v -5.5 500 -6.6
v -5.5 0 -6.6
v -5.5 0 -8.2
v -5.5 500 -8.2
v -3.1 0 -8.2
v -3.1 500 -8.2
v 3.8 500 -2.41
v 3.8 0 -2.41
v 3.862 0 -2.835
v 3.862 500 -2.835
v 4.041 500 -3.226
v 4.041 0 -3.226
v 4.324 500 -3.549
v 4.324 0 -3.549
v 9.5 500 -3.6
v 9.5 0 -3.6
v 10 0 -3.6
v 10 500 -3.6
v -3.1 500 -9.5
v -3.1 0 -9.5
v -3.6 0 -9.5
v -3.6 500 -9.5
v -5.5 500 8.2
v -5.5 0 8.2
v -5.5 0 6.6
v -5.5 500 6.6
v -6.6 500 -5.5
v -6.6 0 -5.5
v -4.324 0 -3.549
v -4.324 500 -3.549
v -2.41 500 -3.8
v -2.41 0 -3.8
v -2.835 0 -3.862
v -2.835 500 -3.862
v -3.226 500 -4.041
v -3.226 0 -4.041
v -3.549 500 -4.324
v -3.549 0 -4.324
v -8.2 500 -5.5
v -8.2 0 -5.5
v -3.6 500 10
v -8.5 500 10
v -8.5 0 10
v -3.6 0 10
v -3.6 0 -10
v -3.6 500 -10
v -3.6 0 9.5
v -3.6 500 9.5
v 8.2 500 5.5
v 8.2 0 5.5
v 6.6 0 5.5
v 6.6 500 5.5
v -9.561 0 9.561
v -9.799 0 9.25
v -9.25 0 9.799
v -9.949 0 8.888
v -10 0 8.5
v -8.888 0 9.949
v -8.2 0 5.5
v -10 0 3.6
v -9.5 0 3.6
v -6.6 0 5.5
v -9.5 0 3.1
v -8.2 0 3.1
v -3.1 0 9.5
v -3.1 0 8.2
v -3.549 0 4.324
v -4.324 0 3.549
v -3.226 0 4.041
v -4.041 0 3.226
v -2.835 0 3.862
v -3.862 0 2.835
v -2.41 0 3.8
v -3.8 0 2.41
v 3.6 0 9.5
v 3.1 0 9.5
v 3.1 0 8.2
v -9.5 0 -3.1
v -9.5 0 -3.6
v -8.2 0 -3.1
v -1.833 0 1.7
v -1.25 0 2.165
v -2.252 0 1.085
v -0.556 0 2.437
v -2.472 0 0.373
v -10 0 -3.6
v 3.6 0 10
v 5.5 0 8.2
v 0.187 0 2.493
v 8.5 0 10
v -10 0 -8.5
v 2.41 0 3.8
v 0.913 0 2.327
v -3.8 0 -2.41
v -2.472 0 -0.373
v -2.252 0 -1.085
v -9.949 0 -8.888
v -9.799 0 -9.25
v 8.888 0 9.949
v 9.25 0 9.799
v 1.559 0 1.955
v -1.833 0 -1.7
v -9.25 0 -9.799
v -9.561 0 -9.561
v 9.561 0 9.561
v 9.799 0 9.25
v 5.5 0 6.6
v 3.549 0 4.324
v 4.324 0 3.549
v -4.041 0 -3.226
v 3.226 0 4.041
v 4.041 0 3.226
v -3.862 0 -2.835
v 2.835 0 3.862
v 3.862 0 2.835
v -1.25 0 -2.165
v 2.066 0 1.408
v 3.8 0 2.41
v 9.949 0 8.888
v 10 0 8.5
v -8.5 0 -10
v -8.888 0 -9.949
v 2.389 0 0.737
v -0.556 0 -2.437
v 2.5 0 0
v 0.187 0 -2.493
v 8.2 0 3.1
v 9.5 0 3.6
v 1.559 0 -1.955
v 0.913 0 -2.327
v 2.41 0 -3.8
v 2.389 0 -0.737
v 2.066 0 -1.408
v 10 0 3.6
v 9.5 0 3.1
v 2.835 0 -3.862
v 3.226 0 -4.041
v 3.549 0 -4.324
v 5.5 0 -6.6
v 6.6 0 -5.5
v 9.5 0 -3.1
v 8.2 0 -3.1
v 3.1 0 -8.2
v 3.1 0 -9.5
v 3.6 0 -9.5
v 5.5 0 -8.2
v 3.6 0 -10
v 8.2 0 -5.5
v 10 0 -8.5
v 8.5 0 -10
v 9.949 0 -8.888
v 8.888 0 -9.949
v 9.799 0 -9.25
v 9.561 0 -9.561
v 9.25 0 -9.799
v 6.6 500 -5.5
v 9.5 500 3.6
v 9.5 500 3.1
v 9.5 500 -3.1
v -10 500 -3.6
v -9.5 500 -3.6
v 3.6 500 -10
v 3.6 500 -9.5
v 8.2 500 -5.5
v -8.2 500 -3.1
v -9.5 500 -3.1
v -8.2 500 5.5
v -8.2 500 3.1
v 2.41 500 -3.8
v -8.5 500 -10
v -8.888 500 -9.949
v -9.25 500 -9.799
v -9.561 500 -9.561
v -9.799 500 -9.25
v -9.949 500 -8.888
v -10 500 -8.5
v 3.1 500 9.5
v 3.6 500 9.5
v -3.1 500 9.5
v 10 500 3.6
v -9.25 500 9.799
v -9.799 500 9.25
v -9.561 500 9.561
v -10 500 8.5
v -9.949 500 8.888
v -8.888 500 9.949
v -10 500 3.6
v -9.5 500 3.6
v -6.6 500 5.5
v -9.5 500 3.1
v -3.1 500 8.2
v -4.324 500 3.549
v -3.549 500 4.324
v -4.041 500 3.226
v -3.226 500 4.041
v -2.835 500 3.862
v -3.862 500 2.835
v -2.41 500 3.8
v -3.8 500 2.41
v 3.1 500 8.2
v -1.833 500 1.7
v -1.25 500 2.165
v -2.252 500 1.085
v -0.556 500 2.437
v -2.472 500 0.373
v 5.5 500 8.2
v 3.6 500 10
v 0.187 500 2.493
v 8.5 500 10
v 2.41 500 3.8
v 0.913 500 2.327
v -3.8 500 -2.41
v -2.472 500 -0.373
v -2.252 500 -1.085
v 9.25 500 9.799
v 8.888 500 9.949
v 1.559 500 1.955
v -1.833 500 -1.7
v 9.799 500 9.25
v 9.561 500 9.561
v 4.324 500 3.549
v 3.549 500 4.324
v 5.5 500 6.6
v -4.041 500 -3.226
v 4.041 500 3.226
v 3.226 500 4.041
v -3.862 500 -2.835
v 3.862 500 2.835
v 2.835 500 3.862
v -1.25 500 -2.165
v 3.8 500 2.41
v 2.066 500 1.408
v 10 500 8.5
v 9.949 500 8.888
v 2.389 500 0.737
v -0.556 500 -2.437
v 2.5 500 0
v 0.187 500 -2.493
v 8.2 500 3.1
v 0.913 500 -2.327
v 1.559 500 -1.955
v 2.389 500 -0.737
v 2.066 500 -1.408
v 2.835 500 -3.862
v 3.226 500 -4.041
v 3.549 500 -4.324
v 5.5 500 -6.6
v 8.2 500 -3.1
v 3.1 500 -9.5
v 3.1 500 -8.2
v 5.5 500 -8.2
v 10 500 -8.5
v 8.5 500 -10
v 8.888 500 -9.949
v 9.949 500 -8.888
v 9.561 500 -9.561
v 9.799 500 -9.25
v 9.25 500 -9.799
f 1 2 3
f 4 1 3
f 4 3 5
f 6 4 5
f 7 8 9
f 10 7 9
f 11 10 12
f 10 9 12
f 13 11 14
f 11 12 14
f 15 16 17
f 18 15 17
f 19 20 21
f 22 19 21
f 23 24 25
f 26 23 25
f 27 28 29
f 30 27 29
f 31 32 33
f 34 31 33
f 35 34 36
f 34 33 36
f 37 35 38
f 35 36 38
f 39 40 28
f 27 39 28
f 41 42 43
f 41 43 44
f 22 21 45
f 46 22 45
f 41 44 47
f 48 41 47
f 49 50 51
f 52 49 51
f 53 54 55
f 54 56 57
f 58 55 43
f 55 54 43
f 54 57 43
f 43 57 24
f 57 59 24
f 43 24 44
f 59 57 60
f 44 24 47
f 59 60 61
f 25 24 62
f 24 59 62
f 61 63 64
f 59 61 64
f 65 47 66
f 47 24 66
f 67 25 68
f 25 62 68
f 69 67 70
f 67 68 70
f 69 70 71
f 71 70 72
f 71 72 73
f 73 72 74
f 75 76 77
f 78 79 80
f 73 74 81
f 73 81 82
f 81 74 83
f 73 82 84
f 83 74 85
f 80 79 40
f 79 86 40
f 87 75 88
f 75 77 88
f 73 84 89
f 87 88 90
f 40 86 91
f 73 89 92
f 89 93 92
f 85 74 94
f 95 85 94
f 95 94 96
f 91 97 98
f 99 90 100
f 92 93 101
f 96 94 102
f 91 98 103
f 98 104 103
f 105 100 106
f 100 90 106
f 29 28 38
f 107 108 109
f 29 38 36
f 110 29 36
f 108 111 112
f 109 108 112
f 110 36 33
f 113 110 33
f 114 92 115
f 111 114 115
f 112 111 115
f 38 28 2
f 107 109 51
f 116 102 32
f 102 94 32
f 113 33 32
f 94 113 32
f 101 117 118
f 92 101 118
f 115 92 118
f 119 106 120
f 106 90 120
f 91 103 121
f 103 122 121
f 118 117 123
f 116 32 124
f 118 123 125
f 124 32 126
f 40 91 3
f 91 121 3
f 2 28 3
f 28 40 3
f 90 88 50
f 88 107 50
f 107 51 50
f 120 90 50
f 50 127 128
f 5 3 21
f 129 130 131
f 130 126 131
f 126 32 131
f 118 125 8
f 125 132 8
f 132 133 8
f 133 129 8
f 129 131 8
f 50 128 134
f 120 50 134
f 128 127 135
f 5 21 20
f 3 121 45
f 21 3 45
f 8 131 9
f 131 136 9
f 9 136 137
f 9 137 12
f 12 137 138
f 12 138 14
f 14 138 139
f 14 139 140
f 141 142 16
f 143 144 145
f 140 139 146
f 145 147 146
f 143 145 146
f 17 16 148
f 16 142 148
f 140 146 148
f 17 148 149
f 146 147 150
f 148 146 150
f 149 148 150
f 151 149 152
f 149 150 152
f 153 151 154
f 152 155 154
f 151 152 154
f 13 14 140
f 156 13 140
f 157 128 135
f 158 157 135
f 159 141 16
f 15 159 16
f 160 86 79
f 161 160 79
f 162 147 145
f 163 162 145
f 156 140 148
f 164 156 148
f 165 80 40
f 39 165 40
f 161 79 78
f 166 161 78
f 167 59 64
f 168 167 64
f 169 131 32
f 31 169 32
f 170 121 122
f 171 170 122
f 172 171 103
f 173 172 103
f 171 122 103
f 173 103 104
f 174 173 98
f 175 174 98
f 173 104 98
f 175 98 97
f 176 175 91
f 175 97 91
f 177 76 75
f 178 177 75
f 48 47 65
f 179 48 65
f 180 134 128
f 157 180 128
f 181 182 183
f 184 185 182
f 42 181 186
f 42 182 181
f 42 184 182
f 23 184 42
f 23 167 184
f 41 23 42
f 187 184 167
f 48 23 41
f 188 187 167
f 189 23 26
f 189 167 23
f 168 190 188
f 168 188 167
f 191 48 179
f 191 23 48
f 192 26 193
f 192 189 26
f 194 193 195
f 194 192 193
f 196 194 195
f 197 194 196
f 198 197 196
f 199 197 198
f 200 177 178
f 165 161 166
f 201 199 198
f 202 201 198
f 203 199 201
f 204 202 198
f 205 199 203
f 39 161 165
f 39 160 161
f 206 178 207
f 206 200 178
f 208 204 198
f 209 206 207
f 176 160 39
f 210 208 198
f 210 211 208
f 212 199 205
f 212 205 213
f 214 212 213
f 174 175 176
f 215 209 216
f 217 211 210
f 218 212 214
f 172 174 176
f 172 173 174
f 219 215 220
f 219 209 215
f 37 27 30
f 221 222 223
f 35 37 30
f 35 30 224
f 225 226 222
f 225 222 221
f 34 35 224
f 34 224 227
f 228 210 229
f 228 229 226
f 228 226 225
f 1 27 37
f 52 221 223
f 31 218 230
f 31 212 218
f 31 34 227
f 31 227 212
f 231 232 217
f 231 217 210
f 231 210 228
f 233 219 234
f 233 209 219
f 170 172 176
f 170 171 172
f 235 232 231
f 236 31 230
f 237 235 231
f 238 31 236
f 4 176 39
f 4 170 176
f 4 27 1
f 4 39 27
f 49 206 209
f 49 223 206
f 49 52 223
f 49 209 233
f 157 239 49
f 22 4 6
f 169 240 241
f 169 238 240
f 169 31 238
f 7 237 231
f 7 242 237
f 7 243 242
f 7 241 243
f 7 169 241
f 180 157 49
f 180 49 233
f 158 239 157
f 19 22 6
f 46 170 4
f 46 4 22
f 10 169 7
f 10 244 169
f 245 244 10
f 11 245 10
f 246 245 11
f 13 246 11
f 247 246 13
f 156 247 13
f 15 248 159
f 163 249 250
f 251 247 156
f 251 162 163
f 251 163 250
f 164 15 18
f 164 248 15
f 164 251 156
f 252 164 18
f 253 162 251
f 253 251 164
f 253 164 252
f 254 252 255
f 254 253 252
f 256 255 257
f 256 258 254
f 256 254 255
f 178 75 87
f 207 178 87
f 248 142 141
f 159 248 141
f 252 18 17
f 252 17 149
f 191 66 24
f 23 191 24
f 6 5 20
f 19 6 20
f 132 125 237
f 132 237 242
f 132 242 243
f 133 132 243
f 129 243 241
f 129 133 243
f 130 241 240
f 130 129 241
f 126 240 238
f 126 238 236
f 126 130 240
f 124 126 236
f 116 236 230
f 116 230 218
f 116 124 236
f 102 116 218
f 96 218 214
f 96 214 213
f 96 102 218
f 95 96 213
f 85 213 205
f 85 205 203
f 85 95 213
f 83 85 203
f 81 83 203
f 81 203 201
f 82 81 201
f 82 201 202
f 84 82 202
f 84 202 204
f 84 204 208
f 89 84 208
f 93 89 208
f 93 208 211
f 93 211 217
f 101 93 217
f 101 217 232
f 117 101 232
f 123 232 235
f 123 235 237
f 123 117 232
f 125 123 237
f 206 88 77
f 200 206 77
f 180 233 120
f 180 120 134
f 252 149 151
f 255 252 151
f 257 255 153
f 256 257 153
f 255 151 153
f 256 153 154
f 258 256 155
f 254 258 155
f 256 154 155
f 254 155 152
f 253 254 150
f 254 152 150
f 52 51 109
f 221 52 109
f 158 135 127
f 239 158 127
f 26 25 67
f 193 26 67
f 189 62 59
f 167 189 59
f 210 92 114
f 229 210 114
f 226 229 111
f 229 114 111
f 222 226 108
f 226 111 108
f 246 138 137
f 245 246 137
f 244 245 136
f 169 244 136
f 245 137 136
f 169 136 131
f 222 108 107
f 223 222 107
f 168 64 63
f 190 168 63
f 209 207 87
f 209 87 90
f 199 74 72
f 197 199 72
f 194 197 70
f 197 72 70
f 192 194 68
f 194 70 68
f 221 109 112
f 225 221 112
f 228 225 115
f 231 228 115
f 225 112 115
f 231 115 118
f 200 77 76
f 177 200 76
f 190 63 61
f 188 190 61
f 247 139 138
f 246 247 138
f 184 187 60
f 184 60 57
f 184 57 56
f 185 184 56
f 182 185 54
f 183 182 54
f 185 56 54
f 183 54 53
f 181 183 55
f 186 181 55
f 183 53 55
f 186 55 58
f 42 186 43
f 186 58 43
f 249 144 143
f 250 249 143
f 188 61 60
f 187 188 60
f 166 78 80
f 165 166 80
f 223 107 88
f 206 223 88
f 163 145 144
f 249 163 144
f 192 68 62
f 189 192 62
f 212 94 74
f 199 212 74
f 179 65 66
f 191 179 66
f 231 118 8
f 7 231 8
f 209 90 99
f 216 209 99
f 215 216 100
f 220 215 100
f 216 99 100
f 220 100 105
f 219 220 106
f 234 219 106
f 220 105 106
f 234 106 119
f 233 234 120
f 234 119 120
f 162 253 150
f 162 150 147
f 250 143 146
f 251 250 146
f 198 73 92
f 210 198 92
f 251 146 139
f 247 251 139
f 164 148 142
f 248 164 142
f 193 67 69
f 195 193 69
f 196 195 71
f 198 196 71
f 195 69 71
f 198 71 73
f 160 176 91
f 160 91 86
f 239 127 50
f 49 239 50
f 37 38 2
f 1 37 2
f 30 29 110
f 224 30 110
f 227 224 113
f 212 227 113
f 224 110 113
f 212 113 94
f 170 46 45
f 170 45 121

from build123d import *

# Parameters (mm, degrees)
SKETCH1_R           = 2.5
BOSS_EXTRUDE1_DEPTH = 500


with BuildPart() as part:
    # Sketch1 → Boss-Extrude1 (new body)
    with BuildSketch(Plane(origin=(0, 0, 0), x_dir=(1, 0, 0), z_dir=(0, 1, 0))):
        with BuildLine():
            ThreePointArc((-10, -8.5), (-9.560660172, -9.560660172), (-8.5, -10))
            Line((-8.5, -10), (-3.6, -10))
            Line((-3.6, -10), (-3.6, -9.5))
            Line((-3.6, -9.5), (-3.1, -9.5))
            Line((-3.1, -9.5), (-3.1, -8.2))
            Line((-3.1, -8.2), (-5.5, -8.2))
            Line((-5.5, -8.2), (-5.5, -6.6))
            Line((-5.5, -6.6), (-3.54898252, -4.32381294))
            ThreePointArc((-3.54898252, -4.32381294), (-3.036882831, -3.937230652), (-2.410097616, -3.8))
            Line((-2.410097616, -3.8), (2.410097616, -3.8))
            ThreePointArc((2.410097616, -3.8), (3.036882831, -3.937230652), (3.54898252, -4.32381294))
            Line((3.54898252, -4.32381294), (5.5, -6.6))
            Line((5.5, -6.6), (5.5, -8.2))
            Line((5.5, -8.2), (3.1, -8.2))
            Line((3.1, -8.2), (3.1, -9.5))
            Line((3.1, -9.5), (3.6, -9.5))
            Line((3.6, -9.5), (3.6, -10))
            Line((3.6, -10), (8.5, -10))
            ThreePointArc((8.5, -10), (9.560660172, -9.560660172), (10, -8.5))
            Line((10, -8.5), (10, -3.6))
            Line((10, -3.6), (9.5, -3.6))
            Line((9.5, -3.6), (9.5, -3.1))
            Line((9.5, -3.1), (8.2, -3.1))
            Line((8.2, -3.1), (8.2, -5.5))
            Line((8.2, -5.5), (6.6, -5.5))
            Line((6.6, -5.5), (4.32381294, -3.54898252))
            ThreePointArc((4.32381294, -3.54898252), (3.937230652, -3.036882831), (3.8, -2.410097616))
            Line((3.8, -2.410097616), (3.8, 2.410097616))
            ThreePointArc((3.8, 2.410097616), (3.937230652, 3.036882831), (4.32381294, 3.54898252))
            Line((4.32381294, 3.54898252), (6.6, 5.5))
            Line((6.6, 5.5), (8.2, 5.5))
            Line((8.2, 5.5), (8.2, 3.1))
            Line((8.2, 3.1), (9.5, 3.1))
            Line((9.5, 3.1), (9.5, 3.6))
            Line((9.5, 3.6), (10, 3.6))
            Line((10, 3.6), (10, 8.5))
            ThreePointArc((10, 8.5), (9.560660172, 9.560660172), (8.5, 10))
            Line((8.5, 10), (3.6, 10))
            Line((3.6, 10), (3.6, 9.5))
            Line((3.6, 9.5), (3.1, 9.5))
            Line((3.1, 9.5), (3.1, 8.2))
            Line((3.1, 8.2), (5.5, 8.2))
            Line((5.5, 8.2), (5.5, 6.6))
            Line((5.5, 6.6), (3.54898252, 4.32381294))
            ThreePointArc((3.54898252, 4.32381294), (3.036882831, 3.937230652), (2.410097616, 3.8))
            Line((2.410097616, 3.8), (-2.410097616, 3.8))
            ThreePointArc((-2.410097616, 3.8), (-3.036882831, 3.937230652), (-3.54898252, 4.32381294))
            Line((-3.54898252, 4.32381294), (-5.5, 6.6))
            Line((-5.5, 6.6), (-5.5, 8.2))
            Line((-5.5, 8.2), (-3.1, 8.2))
            Line((-3.1, 8.2), (-3.1, 9.5))
            Line((-3.1, 9.5), (-3.6, 9.5))
            Line((-3.6, 9.5), (-3.6, 10))
            Line((-3.6, 10), (-8.5, 10))
            ThreePointArc((-8.5, 10), (-9.560660172, 9.560660172), (-10, 8.5))
            Line((-10, 8.5), (-10, 3.6))
            Line((-10, 3.6), (-9.5, 3.6))
            Line((-9.5, 3.6), (-9.5, 3.1))
            Line((-9.5, 3.1), (-8.2, 3.1))
            Line((-8.2, 3.1), (-8.2, 5.5))
            Line((-8.2, 5.5), (-6.6, 5.5))
            Line((-6.6, 5.5), (-4.32381294, 3.54898252))
            ThreePointArc((-4.32381294, 3.54898252), (-3.937230652, 3.036882831), (-3.8, 2.410097616))
            Line((-3.8, 2.410097616), (-3.8, -2.410097616))
            ThreePointArc((-3.8, -2.410097616), (-3.937230652, -3.036882831), (-4.32381294, -3.54898252))
            Line((-4.32381294, -3.54898252), (-6.6, -5.5))
            Line((-6.6, -5.5), (-8.2, -5.5))
            Line((-8.2, -5.5), (-8.2, -3.1))
            Line((-8.2, -3.1), (-9.5, -3.1))
            Line((-9.5, -3.1), (-9.5, -3.6))
            Line((-9.5, -3.6), (-10, -3.6))
            Line((-10, -3.6), (-10, -8.5))
        make_face()
        Circle(SKETCH1_R, mode=Mode.SUBTRACT)
    extrude(amount=BOSS_EXTRUDE1_DEPTH)


solid = part.part
